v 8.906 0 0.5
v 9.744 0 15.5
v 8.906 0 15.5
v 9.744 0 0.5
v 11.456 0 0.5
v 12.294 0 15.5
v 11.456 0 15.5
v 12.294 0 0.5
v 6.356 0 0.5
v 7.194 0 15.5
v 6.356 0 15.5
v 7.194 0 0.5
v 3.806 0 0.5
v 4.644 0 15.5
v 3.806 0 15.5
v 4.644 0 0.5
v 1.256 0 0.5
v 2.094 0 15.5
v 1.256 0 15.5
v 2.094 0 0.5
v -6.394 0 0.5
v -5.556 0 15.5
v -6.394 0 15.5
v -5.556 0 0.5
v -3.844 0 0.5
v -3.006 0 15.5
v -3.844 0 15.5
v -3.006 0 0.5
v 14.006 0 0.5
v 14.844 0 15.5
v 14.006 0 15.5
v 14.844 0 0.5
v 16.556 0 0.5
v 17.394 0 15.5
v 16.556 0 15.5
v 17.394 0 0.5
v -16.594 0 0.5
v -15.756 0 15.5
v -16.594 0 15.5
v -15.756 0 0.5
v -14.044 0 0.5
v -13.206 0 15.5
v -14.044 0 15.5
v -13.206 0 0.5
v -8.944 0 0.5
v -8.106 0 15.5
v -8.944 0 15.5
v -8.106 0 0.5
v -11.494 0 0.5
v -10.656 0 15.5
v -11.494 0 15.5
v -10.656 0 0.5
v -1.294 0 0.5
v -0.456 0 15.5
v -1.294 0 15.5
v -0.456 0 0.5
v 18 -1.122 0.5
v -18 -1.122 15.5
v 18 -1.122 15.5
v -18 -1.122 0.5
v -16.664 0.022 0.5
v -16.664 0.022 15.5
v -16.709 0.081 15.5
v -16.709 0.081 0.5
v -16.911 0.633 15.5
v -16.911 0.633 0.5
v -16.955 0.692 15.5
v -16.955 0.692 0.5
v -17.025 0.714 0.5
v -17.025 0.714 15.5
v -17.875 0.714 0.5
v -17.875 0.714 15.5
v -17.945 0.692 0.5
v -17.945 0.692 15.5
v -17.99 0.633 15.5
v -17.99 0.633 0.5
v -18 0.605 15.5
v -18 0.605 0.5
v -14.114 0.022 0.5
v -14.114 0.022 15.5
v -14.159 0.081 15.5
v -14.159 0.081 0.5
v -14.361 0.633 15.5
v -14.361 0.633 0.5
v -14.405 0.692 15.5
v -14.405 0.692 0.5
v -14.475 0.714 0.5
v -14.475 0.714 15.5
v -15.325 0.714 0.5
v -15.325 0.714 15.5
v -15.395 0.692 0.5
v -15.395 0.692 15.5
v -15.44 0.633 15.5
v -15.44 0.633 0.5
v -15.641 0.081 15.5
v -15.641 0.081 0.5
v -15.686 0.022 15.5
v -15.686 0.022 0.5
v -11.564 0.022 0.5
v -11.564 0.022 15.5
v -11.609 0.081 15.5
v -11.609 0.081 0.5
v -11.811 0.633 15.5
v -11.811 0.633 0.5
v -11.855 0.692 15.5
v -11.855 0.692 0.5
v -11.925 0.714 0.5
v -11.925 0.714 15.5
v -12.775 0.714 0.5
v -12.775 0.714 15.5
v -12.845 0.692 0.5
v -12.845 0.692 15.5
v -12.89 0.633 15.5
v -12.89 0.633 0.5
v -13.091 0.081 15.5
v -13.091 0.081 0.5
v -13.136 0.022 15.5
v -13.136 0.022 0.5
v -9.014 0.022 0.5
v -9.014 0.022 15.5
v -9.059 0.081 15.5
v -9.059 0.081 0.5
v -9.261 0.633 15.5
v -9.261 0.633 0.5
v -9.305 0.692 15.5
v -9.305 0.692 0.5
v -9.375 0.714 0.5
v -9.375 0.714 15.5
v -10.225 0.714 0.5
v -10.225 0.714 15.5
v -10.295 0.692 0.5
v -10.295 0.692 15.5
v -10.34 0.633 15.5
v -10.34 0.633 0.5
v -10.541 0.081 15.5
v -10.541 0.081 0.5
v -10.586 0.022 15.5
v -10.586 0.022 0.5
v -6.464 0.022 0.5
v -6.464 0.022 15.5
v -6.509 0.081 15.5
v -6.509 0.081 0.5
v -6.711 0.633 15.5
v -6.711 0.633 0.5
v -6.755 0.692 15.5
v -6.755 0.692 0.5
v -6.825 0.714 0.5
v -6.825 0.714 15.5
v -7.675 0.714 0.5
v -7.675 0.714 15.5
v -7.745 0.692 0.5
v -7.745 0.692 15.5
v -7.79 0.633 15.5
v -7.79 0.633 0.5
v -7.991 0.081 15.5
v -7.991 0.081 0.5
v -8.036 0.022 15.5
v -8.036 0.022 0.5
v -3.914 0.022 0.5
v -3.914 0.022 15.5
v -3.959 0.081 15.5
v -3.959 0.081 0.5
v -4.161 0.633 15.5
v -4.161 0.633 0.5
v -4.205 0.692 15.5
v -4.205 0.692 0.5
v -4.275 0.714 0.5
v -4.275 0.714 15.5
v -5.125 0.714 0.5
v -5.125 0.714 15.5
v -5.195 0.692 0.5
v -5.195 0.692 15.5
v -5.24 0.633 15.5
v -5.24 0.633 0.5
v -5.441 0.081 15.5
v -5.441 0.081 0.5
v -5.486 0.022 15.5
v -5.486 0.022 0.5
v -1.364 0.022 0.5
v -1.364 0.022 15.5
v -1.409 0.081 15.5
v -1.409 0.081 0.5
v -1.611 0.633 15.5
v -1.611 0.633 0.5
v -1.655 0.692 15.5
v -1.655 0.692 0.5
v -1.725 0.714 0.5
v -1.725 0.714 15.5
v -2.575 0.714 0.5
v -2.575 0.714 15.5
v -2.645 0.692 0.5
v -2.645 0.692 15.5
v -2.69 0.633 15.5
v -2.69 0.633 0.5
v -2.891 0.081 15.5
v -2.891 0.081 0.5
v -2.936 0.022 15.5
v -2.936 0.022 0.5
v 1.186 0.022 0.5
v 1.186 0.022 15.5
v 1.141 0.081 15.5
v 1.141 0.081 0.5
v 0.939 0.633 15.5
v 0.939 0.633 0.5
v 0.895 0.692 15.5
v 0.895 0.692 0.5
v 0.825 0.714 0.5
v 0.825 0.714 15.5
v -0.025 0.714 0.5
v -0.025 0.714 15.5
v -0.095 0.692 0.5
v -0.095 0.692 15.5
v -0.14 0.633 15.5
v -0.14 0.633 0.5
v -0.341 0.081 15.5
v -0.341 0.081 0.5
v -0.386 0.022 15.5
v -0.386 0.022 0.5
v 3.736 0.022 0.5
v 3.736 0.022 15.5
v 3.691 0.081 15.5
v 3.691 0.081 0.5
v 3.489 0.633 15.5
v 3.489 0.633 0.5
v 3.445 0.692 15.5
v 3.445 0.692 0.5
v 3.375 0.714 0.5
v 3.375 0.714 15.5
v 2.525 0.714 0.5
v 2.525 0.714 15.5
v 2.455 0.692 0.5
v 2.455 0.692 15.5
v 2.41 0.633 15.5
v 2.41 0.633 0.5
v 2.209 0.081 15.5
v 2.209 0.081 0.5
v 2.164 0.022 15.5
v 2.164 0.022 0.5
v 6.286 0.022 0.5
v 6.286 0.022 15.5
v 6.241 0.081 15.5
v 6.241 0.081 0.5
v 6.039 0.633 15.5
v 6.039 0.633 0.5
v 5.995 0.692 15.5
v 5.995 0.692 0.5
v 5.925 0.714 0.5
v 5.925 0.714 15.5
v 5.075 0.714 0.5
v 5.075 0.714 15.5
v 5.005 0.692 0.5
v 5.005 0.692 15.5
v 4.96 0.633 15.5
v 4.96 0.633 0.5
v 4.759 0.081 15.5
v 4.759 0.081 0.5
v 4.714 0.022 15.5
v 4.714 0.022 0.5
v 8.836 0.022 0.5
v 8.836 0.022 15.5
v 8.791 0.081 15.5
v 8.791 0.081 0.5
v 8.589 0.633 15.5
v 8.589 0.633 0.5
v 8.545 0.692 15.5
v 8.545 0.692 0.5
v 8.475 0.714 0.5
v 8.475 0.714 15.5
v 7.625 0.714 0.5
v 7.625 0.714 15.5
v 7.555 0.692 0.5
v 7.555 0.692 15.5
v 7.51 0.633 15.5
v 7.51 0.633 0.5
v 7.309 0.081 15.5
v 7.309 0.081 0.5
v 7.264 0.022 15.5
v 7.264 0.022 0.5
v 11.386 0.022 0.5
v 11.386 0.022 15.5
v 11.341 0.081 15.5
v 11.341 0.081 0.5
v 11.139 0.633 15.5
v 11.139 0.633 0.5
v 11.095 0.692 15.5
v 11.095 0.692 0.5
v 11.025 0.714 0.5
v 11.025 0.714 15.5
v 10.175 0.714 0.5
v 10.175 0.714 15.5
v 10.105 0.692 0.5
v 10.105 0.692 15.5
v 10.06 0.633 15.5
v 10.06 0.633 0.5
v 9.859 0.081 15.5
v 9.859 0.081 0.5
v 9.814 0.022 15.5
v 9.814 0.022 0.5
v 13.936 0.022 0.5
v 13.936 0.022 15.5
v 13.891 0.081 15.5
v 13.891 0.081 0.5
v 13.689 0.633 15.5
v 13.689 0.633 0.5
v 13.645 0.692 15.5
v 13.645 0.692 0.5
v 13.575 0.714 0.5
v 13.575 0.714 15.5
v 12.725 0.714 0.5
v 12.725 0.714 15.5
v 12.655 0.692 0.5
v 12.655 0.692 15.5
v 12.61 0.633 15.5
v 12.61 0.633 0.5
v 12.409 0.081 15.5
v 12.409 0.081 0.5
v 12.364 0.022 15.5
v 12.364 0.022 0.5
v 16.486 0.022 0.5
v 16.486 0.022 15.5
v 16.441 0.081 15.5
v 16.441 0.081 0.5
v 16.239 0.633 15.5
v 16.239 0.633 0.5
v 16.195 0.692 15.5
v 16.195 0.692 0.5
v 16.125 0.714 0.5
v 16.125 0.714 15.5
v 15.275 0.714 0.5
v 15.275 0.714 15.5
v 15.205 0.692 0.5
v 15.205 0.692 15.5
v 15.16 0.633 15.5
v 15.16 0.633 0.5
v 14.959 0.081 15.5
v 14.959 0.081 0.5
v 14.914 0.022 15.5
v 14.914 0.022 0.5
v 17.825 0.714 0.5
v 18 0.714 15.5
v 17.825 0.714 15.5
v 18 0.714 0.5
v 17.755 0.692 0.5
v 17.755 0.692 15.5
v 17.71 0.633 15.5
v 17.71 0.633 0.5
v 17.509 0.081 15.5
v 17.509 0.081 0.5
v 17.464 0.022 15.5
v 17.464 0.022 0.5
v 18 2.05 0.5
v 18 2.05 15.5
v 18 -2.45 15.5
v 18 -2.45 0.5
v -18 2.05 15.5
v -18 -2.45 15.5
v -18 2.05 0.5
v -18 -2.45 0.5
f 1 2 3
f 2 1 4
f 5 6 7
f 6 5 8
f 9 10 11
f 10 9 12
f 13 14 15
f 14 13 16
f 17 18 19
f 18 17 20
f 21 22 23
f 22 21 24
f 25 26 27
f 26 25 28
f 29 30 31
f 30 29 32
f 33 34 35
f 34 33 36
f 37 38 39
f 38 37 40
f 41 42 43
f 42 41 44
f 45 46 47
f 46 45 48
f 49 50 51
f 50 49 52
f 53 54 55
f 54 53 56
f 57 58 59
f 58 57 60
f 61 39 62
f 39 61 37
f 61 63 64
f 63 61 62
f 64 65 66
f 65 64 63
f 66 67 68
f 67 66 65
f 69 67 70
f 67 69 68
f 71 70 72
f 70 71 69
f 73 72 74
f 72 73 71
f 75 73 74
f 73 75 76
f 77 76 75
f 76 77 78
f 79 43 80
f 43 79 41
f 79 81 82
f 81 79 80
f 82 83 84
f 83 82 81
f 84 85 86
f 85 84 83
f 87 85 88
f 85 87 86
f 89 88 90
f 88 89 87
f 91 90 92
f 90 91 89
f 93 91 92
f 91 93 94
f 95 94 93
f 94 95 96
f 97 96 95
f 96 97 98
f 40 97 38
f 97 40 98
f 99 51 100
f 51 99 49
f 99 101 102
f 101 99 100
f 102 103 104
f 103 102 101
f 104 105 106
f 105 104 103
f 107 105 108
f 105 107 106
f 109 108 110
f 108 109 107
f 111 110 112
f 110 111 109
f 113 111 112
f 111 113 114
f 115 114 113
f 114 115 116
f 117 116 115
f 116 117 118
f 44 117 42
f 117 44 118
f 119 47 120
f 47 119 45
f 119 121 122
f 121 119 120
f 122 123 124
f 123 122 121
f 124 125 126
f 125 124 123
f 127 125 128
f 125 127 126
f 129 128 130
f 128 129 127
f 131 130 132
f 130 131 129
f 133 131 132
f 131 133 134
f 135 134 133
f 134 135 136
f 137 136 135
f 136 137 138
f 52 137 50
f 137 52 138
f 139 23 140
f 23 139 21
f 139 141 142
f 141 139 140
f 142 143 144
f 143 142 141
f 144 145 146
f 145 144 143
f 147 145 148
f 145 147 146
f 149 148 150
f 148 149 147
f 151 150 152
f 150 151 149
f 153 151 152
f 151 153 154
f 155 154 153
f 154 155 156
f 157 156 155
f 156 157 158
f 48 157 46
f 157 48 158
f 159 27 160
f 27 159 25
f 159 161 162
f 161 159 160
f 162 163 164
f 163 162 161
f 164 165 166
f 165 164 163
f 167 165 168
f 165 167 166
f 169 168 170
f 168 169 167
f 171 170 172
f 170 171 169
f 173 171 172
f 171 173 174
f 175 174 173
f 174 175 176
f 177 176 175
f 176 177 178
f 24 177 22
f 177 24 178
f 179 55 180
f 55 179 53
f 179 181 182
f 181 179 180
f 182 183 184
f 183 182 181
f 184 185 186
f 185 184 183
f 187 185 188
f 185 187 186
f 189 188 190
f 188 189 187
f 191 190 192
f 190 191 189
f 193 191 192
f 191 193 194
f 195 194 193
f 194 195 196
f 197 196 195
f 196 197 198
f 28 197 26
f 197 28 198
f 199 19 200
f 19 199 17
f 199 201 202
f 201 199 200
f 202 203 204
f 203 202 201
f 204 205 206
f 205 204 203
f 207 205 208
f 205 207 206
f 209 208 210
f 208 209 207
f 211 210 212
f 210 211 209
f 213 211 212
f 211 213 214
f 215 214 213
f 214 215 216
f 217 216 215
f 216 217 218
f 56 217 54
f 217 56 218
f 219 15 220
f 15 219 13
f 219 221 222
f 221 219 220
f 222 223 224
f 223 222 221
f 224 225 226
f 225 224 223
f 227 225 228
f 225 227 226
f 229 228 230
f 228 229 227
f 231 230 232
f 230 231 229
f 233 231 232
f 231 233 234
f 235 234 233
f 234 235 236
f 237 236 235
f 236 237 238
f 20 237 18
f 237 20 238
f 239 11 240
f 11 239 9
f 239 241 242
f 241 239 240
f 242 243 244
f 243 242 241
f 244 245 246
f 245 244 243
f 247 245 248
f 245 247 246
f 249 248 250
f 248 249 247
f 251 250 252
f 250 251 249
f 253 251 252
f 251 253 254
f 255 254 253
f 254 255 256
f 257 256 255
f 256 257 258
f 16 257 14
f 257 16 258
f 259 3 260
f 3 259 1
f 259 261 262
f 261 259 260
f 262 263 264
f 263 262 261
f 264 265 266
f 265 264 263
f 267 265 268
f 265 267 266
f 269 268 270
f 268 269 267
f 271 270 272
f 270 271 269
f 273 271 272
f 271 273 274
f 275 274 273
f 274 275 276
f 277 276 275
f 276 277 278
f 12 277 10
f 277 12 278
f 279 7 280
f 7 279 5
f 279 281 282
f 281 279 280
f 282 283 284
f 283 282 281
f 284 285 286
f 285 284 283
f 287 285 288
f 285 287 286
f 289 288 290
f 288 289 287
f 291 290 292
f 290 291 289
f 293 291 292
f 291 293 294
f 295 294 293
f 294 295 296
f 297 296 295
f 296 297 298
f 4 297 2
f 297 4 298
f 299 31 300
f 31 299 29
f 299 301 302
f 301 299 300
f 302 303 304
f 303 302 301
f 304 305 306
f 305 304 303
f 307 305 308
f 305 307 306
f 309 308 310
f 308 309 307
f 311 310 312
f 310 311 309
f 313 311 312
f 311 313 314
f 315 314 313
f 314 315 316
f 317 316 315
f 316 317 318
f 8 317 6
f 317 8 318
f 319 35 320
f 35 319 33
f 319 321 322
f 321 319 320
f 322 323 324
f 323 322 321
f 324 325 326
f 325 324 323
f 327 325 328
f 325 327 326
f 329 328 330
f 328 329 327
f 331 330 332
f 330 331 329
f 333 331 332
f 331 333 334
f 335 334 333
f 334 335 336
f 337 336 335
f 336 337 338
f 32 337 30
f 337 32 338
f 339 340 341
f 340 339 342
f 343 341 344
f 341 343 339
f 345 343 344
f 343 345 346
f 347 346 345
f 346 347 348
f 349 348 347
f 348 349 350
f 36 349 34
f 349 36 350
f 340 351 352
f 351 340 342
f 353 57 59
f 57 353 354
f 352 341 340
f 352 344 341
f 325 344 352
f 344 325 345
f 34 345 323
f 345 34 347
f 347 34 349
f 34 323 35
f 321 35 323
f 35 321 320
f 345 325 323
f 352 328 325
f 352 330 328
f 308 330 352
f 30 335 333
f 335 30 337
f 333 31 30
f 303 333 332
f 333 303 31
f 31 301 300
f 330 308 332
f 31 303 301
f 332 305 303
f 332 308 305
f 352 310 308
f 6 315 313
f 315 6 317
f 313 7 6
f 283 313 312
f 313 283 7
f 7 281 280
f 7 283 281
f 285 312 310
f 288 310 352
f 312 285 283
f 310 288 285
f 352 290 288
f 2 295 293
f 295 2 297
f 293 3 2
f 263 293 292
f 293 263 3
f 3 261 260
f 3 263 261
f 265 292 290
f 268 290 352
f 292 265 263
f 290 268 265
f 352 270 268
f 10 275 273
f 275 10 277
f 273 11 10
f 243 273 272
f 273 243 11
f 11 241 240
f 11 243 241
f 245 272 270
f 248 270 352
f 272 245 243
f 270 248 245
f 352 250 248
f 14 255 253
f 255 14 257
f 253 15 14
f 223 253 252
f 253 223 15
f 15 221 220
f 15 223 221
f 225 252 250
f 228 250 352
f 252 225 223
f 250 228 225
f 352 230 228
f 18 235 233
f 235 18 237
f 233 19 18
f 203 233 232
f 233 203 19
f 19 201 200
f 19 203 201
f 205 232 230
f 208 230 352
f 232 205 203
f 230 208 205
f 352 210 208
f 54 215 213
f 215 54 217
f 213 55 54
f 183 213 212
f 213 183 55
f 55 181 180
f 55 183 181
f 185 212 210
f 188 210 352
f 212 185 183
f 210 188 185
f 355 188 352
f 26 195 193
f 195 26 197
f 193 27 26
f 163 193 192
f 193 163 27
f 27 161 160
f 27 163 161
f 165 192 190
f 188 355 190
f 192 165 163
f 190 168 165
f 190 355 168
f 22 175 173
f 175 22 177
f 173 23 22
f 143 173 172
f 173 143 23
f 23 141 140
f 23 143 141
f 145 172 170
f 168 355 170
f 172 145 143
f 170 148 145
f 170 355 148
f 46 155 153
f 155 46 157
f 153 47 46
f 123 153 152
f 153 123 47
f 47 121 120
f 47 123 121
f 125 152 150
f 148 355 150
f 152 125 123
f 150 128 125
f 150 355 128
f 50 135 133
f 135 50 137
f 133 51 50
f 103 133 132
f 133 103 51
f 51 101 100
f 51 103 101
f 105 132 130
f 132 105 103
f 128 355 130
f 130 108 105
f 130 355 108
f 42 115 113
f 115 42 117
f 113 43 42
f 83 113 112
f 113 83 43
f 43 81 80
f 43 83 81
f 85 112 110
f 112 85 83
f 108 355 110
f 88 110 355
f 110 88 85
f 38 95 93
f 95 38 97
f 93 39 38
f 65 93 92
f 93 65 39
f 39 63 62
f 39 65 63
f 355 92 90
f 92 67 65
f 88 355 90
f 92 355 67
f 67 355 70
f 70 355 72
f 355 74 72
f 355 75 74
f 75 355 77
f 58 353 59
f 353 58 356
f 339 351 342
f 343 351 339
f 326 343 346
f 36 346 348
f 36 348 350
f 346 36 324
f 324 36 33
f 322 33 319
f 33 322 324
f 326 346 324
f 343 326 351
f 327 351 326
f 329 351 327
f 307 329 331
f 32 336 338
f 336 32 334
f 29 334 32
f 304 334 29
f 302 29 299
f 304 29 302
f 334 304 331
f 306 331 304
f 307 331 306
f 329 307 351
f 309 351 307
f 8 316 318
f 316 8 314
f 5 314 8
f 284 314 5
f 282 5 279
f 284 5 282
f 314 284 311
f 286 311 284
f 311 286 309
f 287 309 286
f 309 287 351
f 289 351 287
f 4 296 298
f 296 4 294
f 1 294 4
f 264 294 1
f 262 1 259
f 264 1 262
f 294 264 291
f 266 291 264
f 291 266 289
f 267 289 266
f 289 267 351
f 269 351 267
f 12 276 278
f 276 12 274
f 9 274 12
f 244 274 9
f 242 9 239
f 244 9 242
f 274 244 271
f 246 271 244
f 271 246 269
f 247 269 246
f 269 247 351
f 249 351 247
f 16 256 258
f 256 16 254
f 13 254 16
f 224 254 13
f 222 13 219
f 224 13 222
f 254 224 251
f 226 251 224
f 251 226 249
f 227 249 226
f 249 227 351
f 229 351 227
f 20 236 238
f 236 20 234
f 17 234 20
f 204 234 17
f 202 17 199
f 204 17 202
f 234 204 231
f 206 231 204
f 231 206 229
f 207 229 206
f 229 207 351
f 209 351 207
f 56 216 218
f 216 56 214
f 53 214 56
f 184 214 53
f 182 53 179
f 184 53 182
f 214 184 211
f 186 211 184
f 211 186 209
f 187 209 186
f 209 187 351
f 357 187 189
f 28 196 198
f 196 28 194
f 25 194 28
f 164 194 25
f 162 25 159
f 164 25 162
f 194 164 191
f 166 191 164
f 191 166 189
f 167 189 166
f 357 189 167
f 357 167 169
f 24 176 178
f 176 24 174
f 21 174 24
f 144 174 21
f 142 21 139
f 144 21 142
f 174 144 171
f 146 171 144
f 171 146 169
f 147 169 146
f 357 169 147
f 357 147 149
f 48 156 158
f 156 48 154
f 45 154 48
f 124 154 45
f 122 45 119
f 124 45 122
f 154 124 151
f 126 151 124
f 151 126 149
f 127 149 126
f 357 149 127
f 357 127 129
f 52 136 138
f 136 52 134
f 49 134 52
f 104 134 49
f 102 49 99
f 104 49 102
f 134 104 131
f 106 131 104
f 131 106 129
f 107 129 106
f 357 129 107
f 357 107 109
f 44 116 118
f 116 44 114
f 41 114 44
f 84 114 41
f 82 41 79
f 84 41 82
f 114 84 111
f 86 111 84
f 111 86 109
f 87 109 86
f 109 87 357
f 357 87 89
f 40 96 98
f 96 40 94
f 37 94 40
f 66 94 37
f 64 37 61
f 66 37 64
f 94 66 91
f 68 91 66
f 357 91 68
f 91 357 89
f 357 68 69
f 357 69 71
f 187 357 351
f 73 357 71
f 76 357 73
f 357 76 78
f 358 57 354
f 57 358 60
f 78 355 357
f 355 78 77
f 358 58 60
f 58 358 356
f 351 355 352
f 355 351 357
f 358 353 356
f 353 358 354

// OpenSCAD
// file: configuration.scad
// Rostock Motor End from Jcrocholl modified by Kolergy to:
//    - Take 12x1000mm smooth rods and KB-12-WW Linear Bearings
//    - Increased base height to locate electronics below the base
//    - Stand on three feets


motor_end_height      =  64;  // Was 44
idler_end_height      =  28;
carriage_height       =  32; // Adapted to cover full length +2 of the Linear bearing
platform_thickness    =   8;
bed_thickness         =  12;
pcb_thickness         =   2;
smooth_rod_length     =1000;
platform_hinge_offset =  33;
carriage_hinge_offset =  22;
tower_radius          = 300;
rod_length            = tower_radius * 1.44;
// main file
include <configuration.scad>

coupler_w = carriage_height+4;
coupler_h = 4.5;
coupler_d = 15;

belt_w = 15.5;
belt_n = 16;
belt_margin = 0.50;

coupler();

// coupler
module coupler() {
	difference(){
		translate([0,-0.20,-coupler_d/2+belt_w])cube([coupler_w,coupler_h,coupler_d],center=true);
		//for (axis_x = [-1:2:1]) {
			translate([-20,0,-0.01])
				scale(1.02)belt_length(profile = "T2.5", belt_width = belt_w+1, n = belt_n);
		//}
	}
}

module belt() {
	scale(1.02)belt_length(profile = "T2.5", belt_width = belt_w+1, n = belt_n);
}

// belt
//for (axis_x = [-1:2:1]) {
//	translate([2.00*belt_n*axis_x-11.25,0,-0.01])
//		%scale(1.02)belt_length(profile = "T2.5", belt_width = belt_w+1, n = belt_n);
//}

//================================================
// Module Section
//================================================
//Outer Module
module belt_length(profile = "T2.5", belt_width = 6, n = 10)
{

			if ( profile == "T2.5" ) 
				{ 
					_belt_length(
						profile=profile, 
						n = n, 
						belt_width = belt_width,
						tooth_pitch = 2.5,
						backing_thickness = 0.6 + belt_margin
						);
				}
			if ( profile == "T5" ) 
				{ 
					_belt_length(
						profile=profile, 
						n = n, 
						belt_width = belt_width,
						tooth_pitch = 5,
						backing_thickness = 1 + belt_margin
						);
				}
			if ( profile == "T10" ) 
				{ 
					_belt_length(
						profile=profile, 
						n = n, 
						belt_width = belt_width,
						tooth_pitch = 10,
						backing_thickness = 2 + belt_margin
						);
				}
			if ( profile == "MXL" ) 
				{ 
					_belt_length(
						profile=profile, 
						n = n, 
						belt_width = belt_width,
						tooth_pitch = 2.032,
						backing_thickness = 0.64 + belt_margin
						);
				}


}

//inner module
module _belt_length(profile = "T2.5", n = 10, belt_width = 5, tooth_pitch = 2.5, backing_thickness = 0.6)
{

for( i = [0:n])
	{
		union(){

			if ( profile == "T2.5" ) { translate([tooth_pitch*i,0,0])T2_5(width = belt_width);}
			if ( profile == "T5" ) { translate([tooth_pitch*i,0,0])T5(width = belt_width);}
			if ( profile == "T10" ) { translate([tooth_pitch*i,0,0])T10(width = belt_width);}
			if ( profile == "MXL" ) { translate([tooth_pitch*i,0,0])MXL(width = belt_width);}
			translate([(tooth_pitch*i)-(tooth_pitch/2),-backing_thickness,0])cube([tooth_pitch,backing_thickness,belt_width]);
		}
	}
}

//Tooth Form modules - Taken from http://www.thingiverse.com/thing:1662
module T2_5(width = 2)
	{
	linear_extrude(height=width) polygon([[-0.839258,-0.5],[-0.839258,0],[-0.770246,0.021652],[-0.726369,0.079022],[-0.529167,0.620889],[-0.485025,0.67826],[-0.416278,0.699911],[0.416278,0.699911],[0.484849,0.67826],[0.528814,0.620889],[0.726369,0.079022],[0.770114,0.021652],[0.839258,0],[0.839258,-0.5]]);
	}

module T5(width = 2)
	{
	linear_extrude(height=width) polygon([[-1.632126,-0.5],[-1.632126,0],[-1.568549,0.004939],[-1.507539,0.019367],[-1.450023,0.042686],[-1.396912,0.074224],[-1.349125,0.113379],[-1.307581,0.159508],[-1.273186,0.211991],[-1.246868,0.270192],[-1.009802,0.920362],[-0.983414,0.978433],[-0.949018,1.030788],[-0.907524,1.076798],[-0.859829,1.115847],[-0.80682,1.147314],[-0.749402,1.170562],[-0.688471,1.184956],[-0.624921,1.189895],[0.624971,1.189895],[0.688622,1.184956],[0.749607,1.170562],[0.807043,1.147314],[0.860055,1.115847],[0.907754,1.076798],[0.949269,1.030788],[0.9837,0.978433],[1.010193,0.920362],[1.246907,0.270192],[1.273295,0.211991],[1.307726,0.159508],[1.349276,0.113379],[1.397039,0.074224],[1.450111,0.042686],[1.507589,0.019367],[1.568563,0.004939],[1.632126,0],[1.632126,-0.5]]);
	}

module T10(width = 2)
	{
	linear_extrude(height=width) polygon([[-3.06511,-1],[-3.06511,0],[-2.971998,0.007239],[-2.882718,0.028344],[-2.79859,0.062396],[-2.720931,0.108479],[-2.651061,0.165675],[-2.590298,0.233065],[-2.539962,0.309732],[-2.501371,0.394759],[-1.879071,2.105025],[-1.840363,2.190052],[-1.789939,2.266719],[-1.729114,2.334109],[-1.659202,2.391304],[-1.581518,2.437387],[-1.497376,2.47144],[-1.408092,2.492545],[-1.314979,2.499784],[1.314979,2.499784],[1.408091,2.492545],[1.497371,2.47144],[1.581499,2.437387],[1.659158,2.391304],[1.729028,2.334109],[1.789791,2.266719],[1.840127,2.190052],[1.878718,2.105025],[2.501018,0.394759],[2.539726,0.309732],[2.59015,0.233065],[2.650975,0.165675],[2.720887,0.108479],[2.798571,0.062396],[2.882713,0.028344],[2.971997,0.007239],[3.06511,0],[3.06511,-1]]);
	}

module MXL(width = 2)
	{
	linear_extrude(height=width) polygon([[-0.660421,-0.5],[-0.660421,0],[-0.621898,0.006033],[-0.587714,0.023037],[-0.560056,0.049424],[-0.541182,0.083609],[-0.417357,0.424392],[-0.398413,0.458752],[-0.370649,0.48514],[-0.336324,0.502074],[-0.297744,0.508035],[0.297744,0.508035],[0.336268,0.502074],[0.370452,0.48514],[0.39811,0.458752],[0.416983,0.424392],[0.540808,0.083609],[0.559752,0.049424],[0.587516,0.023037],[0.621841,0.006033],[0.660421,0],[0.660421,-0.5]]);
	}
